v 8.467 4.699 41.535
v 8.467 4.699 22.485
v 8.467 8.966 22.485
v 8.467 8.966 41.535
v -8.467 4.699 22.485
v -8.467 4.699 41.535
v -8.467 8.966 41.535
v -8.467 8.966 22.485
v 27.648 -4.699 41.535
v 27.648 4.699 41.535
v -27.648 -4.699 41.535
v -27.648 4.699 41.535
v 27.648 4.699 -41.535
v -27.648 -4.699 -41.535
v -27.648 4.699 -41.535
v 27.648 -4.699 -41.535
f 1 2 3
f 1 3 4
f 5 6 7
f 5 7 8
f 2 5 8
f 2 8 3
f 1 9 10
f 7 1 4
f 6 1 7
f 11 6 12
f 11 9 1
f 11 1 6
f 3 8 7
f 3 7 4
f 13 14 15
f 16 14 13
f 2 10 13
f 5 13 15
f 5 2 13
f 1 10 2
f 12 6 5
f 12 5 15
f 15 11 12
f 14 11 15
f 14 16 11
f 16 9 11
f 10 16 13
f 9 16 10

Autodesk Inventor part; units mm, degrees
ref_plane "YZ Plane" through (0, 0, 0) normal (1, 0, 0) x (0, 1, 0)
ref_plane "XZ Plane" through (0, 0, 0) normal (0, 1, 0) x (-1, 0, 0)
ref_plane "XY Plane" through (0, 0, 0) normal (0, 0, 1) x (1, 0, 0)
sketch "Sketch1" plane through (0, 0, 0) normal (0, 1, 0) x (-1, 0, 0)
  line L0 (-27.6479, 41.5354) -> (27.6479, 41.5354)
  line L1 (27.6479, 41.5354) -> (27.6479, -41.5354)
  line L2 (27.6479, -41.5354) -> (-27.6479, -41.5353)
  line L3 (-27.6479, -41.5353) -> (-27.6479, 41.5354)
  line L4 (-27.6479, 41.5354) -> (27.6479, -41.5354) construction
  line L5 (27.6479, 41.5354) -> (-27.6479, -41.5353) construction
  point P0 (0, 0)
  dimension "BreadboardWidth" = 55.2958
  dimension "BreadboardLength" = 83.0707
extrude "Breadbord" add sketch "Sketch1" along normal mid plane 9.398
sketch "Sketch2" plane through (0, 4.699, 0) normal (0, 1, 0) x (1, 0, 0)
  line L0 (8.4667, -41.5354) -> (-8.4667, -41.5354)
  line L1 (-8.4667, -41.5354) -> (-8.4667, -22.4854)
  line L2 (-8.4667, -22.4854) -> (8.4667, -22.4854)
  line L3 (8.4667, -22.4854) -> (8.4667, -41.5354)
  line L4 (8.4667, -41.5354) -> (-8.4667, -22.4854) construction
  line L5 (-8.4667, -41.5354) -> (8.4667, -22.4854) construction
  line L6 (27.6479, 41.5353) -> (-27.6479, 41.5354) projected
  line L7 (-27.6479, -41.5354) -> (27.6479, -41.5354) projected
  point P0 (0, 0)
  point P1 (0, -32.0104)
  dimension "d4" = 16.9333
  dimension "d5" = 19.05
extrude "LIDAR Chip" add sketch "Sketch2" along normal blind 4.2672
properties part number "Breadboard"
